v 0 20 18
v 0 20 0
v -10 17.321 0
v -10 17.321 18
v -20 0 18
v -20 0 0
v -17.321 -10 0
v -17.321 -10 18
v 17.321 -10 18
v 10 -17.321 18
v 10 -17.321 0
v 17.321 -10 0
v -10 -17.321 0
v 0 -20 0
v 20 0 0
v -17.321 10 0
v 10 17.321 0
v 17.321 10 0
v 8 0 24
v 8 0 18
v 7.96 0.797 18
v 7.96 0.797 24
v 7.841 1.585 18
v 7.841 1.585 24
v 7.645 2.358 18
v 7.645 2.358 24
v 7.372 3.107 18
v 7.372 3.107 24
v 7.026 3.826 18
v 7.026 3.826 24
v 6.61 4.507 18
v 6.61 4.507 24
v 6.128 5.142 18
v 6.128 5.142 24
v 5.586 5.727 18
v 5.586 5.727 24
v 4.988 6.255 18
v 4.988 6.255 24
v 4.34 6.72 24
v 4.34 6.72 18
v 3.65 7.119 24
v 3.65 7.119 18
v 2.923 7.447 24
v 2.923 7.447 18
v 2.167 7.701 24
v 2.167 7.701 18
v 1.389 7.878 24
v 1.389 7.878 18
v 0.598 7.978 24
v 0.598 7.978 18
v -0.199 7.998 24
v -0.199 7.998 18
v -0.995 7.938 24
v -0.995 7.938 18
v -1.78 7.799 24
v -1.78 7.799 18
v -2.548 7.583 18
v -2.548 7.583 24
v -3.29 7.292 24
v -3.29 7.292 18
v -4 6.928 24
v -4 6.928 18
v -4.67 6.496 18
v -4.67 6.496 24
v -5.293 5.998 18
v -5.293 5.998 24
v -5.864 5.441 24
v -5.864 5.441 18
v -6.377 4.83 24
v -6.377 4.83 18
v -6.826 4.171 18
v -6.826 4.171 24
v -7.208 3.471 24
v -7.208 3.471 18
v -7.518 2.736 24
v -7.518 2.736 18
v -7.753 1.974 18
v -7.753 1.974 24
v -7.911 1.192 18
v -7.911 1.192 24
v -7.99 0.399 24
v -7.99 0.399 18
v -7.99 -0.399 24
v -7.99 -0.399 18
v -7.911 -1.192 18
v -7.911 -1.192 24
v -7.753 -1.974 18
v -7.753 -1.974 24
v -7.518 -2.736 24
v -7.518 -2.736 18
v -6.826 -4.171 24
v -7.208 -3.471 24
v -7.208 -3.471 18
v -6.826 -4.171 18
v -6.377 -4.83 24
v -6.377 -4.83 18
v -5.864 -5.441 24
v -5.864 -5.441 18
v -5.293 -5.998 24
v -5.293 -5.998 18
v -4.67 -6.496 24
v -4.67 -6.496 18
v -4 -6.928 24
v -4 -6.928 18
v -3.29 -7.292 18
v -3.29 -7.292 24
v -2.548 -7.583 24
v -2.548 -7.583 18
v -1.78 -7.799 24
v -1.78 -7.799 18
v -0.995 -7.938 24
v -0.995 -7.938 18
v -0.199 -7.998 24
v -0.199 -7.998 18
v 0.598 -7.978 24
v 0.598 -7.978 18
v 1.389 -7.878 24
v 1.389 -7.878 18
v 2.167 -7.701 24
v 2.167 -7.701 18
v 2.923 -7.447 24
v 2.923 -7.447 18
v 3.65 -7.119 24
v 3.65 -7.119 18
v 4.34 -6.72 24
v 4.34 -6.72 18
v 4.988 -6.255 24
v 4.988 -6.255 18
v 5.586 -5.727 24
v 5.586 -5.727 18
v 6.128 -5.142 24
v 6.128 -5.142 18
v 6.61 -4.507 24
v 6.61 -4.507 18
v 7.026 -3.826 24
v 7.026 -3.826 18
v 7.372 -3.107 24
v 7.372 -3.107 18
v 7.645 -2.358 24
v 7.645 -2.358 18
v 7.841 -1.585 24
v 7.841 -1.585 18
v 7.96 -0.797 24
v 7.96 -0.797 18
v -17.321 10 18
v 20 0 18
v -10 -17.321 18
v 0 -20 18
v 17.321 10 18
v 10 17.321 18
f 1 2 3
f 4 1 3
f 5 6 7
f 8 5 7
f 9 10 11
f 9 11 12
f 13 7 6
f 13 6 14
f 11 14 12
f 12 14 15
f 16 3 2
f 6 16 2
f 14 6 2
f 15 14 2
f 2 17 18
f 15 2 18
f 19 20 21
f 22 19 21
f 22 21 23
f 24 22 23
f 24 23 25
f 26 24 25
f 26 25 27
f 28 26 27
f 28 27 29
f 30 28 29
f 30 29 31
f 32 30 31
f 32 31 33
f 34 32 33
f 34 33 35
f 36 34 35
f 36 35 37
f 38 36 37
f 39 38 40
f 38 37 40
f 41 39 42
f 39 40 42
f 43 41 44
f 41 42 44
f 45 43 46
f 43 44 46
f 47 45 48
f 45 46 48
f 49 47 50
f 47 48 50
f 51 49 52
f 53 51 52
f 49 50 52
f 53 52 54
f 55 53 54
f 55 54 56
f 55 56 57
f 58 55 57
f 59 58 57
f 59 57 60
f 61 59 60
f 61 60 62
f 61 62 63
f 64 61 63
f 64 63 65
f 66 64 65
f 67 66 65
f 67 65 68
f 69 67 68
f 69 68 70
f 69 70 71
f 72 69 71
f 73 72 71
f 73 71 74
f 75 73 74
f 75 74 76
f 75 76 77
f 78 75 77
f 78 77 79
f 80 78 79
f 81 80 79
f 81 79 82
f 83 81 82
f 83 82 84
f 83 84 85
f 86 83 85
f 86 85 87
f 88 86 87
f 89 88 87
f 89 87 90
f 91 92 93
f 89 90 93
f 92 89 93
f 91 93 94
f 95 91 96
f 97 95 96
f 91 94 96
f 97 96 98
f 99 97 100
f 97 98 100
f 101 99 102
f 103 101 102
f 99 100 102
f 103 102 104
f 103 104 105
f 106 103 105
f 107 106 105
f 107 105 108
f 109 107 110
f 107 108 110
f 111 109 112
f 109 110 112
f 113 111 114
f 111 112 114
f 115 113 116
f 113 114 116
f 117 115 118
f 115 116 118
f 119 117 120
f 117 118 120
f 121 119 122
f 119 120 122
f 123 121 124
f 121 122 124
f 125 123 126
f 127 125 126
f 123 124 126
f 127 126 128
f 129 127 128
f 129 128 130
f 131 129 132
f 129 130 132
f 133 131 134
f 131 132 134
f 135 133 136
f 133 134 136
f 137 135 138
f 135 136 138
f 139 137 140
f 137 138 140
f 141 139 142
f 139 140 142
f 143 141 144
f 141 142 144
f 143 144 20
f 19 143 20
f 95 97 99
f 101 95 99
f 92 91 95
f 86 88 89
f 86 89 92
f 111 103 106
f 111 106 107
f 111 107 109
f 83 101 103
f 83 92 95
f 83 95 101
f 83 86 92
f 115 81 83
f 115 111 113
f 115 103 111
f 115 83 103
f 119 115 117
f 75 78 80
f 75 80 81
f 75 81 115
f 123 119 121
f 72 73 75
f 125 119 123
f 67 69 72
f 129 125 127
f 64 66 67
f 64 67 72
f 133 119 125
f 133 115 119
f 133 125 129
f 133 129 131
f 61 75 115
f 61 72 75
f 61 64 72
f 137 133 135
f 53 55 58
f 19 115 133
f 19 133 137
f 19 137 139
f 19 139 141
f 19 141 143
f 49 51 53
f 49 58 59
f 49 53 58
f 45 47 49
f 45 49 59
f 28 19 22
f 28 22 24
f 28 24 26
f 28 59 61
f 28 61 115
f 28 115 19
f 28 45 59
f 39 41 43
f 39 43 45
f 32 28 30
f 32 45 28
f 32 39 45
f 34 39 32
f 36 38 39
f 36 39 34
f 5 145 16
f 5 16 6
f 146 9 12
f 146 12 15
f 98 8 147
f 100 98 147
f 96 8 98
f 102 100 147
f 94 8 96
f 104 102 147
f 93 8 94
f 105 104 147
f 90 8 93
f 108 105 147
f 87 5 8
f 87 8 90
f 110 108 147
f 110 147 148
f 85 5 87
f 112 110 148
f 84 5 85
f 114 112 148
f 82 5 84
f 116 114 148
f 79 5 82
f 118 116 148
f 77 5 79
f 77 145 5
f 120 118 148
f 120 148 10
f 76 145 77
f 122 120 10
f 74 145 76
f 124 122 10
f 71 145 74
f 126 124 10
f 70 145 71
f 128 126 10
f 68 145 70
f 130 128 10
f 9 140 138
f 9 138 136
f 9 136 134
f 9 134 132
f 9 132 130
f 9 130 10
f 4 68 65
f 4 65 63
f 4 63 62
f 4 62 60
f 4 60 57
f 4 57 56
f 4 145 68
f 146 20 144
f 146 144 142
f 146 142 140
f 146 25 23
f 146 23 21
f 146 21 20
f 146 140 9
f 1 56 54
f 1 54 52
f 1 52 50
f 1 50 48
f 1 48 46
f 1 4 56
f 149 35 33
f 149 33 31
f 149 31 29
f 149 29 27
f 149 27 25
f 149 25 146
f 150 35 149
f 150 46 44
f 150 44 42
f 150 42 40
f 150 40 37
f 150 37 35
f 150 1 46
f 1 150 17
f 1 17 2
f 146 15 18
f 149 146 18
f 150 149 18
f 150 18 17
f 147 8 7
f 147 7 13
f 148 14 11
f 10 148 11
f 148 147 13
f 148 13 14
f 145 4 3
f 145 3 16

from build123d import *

# Parameters (mm, degrees)
SKETCH_1_R          = 8
EXTRUDE_1_DEPTH     = 24
SKETCH_2_R          = 42
EXTRUDE_2_DEPTH     = 18
SKETCH_3_OUTSIDE_W  = 110.238
SKETCH_3_OUTSIDE_H  = 110.238
CUT_EXTRUDE_1_DEPTH = 63.064482597


with BuildPart() as part:
    # 草图1 → 凸台-拉伸1 (new body)
    with BuildSketch(Plane.XY):
        Circle(SKETCH_1_R)
    extrude(amount=EXTRUDE_1_DEPTH)

    # 草图2 → 凸台-拉伸2 (add)
    with BuildSketch(Plane.XY):
        Circle(SKETCH_2_R)
    extrude(amount=EXTRUDE_2_DEPTH)

    # 草图3 outside → 切除-拉伸1 (cut, through all)
    with BuildSketch(Plane.XY.offset(18)):
        Rectangle(SKETCH_3_OUTSIDE_W, SKETCH_3_OUTSIDE_H)
        Polygon((20, 0), (17.320508076, 10), (10, 17.320508076), (0, 20), (-10, 17.320508076), (-17.320508076, 10), (-20, 0), (-17.320508076, -10), (-10, -17.320508076), (0, -20), (10, -17.320508076), (17.320508076, -10), align=None, mode=Mode.SUBTRACT)
    extrude(amount=-CUT_EXTRUDE_1_DEPTH, mode=Mode.SUBTRACT)


solid = part.part
